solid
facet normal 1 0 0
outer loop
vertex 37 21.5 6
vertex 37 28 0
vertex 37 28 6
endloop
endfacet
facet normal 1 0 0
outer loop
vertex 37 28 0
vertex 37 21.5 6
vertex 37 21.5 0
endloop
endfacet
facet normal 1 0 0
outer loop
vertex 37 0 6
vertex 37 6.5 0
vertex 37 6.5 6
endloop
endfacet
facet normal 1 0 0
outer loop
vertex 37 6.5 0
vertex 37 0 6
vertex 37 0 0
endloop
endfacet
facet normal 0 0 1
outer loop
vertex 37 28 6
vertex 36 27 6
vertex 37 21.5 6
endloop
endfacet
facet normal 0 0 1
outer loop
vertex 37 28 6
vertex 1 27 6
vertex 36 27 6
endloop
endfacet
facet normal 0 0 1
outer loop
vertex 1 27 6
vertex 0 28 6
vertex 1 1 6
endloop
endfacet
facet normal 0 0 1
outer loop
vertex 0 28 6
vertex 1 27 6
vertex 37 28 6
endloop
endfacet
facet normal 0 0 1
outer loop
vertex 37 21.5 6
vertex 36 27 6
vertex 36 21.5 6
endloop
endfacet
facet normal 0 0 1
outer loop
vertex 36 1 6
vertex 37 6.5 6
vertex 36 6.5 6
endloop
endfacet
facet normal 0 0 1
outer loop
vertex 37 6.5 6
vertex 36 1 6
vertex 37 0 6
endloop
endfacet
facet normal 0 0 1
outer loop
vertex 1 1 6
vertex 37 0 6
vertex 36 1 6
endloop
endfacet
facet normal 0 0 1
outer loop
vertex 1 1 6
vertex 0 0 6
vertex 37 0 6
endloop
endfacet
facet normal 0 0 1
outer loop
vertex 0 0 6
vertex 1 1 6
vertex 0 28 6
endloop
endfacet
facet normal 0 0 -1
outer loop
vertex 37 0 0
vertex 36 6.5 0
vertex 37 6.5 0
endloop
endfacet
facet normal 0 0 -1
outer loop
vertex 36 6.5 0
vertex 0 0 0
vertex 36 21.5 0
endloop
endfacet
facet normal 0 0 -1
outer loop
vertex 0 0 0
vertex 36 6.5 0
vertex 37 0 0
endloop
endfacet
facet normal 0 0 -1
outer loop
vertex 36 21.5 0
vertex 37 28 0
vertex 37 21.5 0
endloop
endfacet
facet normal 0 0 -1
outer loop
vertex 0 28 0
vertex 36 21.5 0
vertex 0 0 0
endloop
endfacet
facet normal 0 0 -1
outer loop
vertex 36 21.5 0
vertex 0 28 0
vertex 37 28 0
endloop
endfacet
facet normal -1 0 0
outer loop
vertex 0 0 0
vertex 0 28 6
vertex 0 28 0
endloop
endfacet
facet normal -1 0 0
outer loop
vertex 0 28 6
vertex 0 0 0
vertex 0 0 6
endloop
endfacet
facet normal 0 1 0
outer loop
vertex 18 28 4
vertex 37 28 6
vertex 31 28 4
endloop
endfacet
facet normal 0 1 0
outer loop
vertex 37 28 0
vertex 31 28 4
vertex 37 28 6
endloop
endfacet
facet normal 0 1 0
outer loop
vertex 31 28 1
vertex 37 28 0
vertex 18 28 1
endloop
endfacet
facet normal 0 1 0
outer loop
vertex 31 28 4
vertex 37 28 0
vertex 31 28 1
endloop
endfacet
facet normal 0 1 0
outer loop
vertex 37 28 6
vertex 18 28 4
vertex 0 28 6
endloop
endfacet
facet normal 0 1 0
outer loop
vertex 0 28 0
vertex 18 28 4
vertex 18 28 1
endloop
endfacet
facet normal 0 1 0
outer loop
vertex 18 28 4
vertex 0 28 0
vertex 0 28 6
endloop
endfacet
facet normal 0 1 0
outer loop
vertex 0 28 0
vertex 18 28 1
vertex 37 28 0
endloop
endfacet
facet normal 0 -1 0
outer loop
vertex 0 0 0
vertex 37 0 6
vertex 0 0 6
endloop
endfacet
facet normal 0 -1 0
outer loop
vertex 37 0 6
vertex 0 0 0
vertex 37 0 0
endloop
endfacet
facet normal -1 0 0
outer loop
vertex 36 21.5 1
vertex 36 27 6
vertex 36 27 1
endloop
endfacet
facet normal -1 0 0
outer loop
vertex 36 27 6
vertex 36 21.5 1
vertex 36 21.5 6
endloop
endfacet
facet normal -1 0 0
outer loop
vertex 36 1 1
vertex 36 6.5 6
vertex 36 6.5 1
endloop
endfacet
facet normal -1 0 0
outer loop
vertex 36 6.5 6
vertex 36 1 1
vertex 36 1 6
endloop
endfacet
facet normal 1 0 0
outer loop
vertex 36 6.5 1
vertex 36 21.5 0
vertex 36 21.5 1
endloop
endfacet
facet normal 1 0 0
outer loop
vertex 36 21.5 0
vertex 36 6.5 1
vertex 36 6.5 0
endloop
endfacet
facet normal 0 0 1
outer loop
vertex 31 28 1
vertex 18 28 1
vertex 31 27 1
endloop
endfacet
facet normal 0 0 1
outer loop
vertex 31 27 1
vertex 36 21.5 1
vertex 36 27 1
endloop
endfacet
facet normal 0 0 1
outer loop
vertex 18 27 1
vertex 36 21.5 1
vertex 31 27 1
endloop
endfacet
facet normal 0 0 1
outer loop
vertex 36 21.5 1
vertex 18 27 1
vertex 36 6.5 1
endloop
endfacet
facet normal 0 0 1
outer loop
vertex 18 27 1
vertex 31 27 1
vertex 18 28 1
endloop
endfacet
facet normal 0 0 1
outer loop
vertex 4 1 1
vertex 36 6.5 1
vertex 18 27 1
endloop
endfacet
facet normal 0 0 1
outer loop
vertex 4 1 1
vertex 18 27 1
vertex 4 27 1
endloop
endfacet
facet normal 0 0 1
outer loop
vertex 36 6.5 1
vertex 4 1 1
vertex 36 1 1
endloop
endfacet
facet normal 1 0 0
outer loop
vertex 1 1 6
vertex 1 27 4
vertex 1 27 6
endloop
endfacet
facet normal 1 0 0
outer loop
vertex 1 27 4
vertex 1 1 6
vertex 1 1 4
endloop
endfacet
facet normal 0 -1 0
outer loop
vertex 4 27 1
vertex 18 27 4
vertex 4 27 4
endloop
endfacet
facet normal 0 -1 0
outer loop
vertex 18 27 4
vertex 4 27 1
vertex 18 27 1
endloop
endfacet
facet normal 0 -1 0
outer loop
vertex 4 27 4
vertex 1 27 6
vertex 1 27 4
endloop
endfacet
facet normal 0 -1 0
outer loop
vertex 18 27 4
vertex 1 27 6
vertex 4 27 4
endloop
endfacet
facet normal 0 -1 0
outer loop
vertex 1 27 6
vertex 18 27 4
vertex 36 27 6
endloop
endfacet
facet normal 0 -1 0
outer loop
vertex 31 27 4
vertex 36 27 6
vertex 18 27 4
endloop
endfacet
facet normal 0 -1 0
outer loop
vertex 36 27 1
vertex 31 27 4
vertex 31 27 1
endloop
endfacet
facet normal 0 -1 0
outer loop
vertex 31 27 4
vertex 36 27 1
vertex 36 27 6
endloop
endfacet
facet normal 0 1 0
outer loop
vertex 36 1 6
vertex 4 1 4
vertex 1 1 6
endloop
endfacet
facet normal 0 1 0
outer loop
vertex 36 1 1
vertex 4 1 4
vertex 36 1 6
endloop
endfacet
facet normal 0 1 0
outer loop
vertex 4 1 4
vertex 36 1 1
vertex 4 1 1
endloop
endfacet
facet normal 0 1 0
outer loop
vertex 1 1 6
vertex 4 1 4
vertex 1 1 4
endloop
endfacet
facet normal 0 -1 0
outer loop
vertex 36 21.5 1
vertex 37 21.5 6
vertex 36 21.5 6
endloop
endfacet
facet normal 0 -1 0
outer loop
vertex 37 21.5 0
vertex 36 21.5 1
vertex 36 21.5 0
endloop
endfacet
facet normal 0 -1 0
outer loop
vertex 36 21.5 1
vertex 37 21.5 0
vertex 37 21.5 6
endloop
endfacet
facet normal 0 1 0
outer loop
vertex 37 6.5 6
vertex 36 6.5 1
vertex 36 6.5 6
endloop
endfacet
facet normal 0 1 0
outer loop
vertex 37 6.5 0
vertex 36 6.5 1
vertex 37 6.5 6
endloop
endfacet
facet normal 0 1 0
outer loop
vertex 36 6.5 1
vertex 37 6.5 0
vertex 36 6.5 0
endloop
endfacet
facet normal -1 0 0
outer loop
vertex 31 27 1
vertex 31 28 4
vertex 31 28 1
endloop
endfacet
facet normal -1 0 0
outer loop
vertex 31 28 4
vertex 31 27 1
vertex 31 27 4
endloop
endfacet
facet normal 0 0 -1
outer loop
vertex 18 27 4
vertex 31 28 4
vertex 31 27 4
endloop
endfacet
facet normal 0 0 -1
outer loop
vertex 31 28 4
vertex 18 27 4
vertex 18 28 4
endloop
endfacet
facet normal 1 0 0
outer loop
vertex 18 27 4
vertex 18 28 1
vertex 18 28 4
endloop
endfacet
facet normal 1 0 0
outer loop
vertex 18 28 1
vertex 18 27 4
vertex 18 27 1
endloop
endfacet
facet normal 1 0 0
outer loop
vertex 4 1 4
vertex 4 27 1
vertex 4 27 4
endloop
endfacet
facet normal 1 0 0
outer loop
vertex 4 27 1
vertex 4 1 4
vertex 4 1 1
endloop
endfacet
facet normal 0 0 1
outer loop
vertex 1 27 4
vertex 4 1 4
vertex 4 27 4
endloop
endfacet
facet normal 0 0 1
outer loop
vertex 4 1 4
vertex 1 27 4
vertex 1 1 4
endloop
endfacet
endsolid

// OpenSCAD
esp_x=35;
esp_y=26;
esp_z=7;

case_thickness = 1;

usb_y=9;
usb_z=3;
usb_plug_thickness_z = 2;
usb_plug_thickness_y = 3;

cable_x = 13;
cable_start_x = 17;

case();

module esp() {
    cube([esp_x, esp_y, esp_z]);
}

module case() {
    union() {
        difference() {
            cube([esp_x+2*case_thickness, esp_y + 2*case_thickness, case_thickness + usb_z + 2]);
            translate([case_thickness, case_thickness, case_thickness]) esp();
            //usb cutout
            translate([case_thickness + esp_x, case_thickness + esp_y/2 - (usb_y + 2*usb_plug_thickness_y)/2, 0]) cube([case_thickness,usb_y+2*usb_plug_thickness_y, case_thickness + usb_z + usb_plug_thickness_z]);
            //cable cutout
            translate([case_thickness + cable_start_x, case_thickness + esp_y, case_thickness]) cube([cable_x, case_thickness, usb_z]);
        }
        translate([case_thickness, case_thickness, case_thickness]) cube([3, esp_y, usb_z]);
    }
}
